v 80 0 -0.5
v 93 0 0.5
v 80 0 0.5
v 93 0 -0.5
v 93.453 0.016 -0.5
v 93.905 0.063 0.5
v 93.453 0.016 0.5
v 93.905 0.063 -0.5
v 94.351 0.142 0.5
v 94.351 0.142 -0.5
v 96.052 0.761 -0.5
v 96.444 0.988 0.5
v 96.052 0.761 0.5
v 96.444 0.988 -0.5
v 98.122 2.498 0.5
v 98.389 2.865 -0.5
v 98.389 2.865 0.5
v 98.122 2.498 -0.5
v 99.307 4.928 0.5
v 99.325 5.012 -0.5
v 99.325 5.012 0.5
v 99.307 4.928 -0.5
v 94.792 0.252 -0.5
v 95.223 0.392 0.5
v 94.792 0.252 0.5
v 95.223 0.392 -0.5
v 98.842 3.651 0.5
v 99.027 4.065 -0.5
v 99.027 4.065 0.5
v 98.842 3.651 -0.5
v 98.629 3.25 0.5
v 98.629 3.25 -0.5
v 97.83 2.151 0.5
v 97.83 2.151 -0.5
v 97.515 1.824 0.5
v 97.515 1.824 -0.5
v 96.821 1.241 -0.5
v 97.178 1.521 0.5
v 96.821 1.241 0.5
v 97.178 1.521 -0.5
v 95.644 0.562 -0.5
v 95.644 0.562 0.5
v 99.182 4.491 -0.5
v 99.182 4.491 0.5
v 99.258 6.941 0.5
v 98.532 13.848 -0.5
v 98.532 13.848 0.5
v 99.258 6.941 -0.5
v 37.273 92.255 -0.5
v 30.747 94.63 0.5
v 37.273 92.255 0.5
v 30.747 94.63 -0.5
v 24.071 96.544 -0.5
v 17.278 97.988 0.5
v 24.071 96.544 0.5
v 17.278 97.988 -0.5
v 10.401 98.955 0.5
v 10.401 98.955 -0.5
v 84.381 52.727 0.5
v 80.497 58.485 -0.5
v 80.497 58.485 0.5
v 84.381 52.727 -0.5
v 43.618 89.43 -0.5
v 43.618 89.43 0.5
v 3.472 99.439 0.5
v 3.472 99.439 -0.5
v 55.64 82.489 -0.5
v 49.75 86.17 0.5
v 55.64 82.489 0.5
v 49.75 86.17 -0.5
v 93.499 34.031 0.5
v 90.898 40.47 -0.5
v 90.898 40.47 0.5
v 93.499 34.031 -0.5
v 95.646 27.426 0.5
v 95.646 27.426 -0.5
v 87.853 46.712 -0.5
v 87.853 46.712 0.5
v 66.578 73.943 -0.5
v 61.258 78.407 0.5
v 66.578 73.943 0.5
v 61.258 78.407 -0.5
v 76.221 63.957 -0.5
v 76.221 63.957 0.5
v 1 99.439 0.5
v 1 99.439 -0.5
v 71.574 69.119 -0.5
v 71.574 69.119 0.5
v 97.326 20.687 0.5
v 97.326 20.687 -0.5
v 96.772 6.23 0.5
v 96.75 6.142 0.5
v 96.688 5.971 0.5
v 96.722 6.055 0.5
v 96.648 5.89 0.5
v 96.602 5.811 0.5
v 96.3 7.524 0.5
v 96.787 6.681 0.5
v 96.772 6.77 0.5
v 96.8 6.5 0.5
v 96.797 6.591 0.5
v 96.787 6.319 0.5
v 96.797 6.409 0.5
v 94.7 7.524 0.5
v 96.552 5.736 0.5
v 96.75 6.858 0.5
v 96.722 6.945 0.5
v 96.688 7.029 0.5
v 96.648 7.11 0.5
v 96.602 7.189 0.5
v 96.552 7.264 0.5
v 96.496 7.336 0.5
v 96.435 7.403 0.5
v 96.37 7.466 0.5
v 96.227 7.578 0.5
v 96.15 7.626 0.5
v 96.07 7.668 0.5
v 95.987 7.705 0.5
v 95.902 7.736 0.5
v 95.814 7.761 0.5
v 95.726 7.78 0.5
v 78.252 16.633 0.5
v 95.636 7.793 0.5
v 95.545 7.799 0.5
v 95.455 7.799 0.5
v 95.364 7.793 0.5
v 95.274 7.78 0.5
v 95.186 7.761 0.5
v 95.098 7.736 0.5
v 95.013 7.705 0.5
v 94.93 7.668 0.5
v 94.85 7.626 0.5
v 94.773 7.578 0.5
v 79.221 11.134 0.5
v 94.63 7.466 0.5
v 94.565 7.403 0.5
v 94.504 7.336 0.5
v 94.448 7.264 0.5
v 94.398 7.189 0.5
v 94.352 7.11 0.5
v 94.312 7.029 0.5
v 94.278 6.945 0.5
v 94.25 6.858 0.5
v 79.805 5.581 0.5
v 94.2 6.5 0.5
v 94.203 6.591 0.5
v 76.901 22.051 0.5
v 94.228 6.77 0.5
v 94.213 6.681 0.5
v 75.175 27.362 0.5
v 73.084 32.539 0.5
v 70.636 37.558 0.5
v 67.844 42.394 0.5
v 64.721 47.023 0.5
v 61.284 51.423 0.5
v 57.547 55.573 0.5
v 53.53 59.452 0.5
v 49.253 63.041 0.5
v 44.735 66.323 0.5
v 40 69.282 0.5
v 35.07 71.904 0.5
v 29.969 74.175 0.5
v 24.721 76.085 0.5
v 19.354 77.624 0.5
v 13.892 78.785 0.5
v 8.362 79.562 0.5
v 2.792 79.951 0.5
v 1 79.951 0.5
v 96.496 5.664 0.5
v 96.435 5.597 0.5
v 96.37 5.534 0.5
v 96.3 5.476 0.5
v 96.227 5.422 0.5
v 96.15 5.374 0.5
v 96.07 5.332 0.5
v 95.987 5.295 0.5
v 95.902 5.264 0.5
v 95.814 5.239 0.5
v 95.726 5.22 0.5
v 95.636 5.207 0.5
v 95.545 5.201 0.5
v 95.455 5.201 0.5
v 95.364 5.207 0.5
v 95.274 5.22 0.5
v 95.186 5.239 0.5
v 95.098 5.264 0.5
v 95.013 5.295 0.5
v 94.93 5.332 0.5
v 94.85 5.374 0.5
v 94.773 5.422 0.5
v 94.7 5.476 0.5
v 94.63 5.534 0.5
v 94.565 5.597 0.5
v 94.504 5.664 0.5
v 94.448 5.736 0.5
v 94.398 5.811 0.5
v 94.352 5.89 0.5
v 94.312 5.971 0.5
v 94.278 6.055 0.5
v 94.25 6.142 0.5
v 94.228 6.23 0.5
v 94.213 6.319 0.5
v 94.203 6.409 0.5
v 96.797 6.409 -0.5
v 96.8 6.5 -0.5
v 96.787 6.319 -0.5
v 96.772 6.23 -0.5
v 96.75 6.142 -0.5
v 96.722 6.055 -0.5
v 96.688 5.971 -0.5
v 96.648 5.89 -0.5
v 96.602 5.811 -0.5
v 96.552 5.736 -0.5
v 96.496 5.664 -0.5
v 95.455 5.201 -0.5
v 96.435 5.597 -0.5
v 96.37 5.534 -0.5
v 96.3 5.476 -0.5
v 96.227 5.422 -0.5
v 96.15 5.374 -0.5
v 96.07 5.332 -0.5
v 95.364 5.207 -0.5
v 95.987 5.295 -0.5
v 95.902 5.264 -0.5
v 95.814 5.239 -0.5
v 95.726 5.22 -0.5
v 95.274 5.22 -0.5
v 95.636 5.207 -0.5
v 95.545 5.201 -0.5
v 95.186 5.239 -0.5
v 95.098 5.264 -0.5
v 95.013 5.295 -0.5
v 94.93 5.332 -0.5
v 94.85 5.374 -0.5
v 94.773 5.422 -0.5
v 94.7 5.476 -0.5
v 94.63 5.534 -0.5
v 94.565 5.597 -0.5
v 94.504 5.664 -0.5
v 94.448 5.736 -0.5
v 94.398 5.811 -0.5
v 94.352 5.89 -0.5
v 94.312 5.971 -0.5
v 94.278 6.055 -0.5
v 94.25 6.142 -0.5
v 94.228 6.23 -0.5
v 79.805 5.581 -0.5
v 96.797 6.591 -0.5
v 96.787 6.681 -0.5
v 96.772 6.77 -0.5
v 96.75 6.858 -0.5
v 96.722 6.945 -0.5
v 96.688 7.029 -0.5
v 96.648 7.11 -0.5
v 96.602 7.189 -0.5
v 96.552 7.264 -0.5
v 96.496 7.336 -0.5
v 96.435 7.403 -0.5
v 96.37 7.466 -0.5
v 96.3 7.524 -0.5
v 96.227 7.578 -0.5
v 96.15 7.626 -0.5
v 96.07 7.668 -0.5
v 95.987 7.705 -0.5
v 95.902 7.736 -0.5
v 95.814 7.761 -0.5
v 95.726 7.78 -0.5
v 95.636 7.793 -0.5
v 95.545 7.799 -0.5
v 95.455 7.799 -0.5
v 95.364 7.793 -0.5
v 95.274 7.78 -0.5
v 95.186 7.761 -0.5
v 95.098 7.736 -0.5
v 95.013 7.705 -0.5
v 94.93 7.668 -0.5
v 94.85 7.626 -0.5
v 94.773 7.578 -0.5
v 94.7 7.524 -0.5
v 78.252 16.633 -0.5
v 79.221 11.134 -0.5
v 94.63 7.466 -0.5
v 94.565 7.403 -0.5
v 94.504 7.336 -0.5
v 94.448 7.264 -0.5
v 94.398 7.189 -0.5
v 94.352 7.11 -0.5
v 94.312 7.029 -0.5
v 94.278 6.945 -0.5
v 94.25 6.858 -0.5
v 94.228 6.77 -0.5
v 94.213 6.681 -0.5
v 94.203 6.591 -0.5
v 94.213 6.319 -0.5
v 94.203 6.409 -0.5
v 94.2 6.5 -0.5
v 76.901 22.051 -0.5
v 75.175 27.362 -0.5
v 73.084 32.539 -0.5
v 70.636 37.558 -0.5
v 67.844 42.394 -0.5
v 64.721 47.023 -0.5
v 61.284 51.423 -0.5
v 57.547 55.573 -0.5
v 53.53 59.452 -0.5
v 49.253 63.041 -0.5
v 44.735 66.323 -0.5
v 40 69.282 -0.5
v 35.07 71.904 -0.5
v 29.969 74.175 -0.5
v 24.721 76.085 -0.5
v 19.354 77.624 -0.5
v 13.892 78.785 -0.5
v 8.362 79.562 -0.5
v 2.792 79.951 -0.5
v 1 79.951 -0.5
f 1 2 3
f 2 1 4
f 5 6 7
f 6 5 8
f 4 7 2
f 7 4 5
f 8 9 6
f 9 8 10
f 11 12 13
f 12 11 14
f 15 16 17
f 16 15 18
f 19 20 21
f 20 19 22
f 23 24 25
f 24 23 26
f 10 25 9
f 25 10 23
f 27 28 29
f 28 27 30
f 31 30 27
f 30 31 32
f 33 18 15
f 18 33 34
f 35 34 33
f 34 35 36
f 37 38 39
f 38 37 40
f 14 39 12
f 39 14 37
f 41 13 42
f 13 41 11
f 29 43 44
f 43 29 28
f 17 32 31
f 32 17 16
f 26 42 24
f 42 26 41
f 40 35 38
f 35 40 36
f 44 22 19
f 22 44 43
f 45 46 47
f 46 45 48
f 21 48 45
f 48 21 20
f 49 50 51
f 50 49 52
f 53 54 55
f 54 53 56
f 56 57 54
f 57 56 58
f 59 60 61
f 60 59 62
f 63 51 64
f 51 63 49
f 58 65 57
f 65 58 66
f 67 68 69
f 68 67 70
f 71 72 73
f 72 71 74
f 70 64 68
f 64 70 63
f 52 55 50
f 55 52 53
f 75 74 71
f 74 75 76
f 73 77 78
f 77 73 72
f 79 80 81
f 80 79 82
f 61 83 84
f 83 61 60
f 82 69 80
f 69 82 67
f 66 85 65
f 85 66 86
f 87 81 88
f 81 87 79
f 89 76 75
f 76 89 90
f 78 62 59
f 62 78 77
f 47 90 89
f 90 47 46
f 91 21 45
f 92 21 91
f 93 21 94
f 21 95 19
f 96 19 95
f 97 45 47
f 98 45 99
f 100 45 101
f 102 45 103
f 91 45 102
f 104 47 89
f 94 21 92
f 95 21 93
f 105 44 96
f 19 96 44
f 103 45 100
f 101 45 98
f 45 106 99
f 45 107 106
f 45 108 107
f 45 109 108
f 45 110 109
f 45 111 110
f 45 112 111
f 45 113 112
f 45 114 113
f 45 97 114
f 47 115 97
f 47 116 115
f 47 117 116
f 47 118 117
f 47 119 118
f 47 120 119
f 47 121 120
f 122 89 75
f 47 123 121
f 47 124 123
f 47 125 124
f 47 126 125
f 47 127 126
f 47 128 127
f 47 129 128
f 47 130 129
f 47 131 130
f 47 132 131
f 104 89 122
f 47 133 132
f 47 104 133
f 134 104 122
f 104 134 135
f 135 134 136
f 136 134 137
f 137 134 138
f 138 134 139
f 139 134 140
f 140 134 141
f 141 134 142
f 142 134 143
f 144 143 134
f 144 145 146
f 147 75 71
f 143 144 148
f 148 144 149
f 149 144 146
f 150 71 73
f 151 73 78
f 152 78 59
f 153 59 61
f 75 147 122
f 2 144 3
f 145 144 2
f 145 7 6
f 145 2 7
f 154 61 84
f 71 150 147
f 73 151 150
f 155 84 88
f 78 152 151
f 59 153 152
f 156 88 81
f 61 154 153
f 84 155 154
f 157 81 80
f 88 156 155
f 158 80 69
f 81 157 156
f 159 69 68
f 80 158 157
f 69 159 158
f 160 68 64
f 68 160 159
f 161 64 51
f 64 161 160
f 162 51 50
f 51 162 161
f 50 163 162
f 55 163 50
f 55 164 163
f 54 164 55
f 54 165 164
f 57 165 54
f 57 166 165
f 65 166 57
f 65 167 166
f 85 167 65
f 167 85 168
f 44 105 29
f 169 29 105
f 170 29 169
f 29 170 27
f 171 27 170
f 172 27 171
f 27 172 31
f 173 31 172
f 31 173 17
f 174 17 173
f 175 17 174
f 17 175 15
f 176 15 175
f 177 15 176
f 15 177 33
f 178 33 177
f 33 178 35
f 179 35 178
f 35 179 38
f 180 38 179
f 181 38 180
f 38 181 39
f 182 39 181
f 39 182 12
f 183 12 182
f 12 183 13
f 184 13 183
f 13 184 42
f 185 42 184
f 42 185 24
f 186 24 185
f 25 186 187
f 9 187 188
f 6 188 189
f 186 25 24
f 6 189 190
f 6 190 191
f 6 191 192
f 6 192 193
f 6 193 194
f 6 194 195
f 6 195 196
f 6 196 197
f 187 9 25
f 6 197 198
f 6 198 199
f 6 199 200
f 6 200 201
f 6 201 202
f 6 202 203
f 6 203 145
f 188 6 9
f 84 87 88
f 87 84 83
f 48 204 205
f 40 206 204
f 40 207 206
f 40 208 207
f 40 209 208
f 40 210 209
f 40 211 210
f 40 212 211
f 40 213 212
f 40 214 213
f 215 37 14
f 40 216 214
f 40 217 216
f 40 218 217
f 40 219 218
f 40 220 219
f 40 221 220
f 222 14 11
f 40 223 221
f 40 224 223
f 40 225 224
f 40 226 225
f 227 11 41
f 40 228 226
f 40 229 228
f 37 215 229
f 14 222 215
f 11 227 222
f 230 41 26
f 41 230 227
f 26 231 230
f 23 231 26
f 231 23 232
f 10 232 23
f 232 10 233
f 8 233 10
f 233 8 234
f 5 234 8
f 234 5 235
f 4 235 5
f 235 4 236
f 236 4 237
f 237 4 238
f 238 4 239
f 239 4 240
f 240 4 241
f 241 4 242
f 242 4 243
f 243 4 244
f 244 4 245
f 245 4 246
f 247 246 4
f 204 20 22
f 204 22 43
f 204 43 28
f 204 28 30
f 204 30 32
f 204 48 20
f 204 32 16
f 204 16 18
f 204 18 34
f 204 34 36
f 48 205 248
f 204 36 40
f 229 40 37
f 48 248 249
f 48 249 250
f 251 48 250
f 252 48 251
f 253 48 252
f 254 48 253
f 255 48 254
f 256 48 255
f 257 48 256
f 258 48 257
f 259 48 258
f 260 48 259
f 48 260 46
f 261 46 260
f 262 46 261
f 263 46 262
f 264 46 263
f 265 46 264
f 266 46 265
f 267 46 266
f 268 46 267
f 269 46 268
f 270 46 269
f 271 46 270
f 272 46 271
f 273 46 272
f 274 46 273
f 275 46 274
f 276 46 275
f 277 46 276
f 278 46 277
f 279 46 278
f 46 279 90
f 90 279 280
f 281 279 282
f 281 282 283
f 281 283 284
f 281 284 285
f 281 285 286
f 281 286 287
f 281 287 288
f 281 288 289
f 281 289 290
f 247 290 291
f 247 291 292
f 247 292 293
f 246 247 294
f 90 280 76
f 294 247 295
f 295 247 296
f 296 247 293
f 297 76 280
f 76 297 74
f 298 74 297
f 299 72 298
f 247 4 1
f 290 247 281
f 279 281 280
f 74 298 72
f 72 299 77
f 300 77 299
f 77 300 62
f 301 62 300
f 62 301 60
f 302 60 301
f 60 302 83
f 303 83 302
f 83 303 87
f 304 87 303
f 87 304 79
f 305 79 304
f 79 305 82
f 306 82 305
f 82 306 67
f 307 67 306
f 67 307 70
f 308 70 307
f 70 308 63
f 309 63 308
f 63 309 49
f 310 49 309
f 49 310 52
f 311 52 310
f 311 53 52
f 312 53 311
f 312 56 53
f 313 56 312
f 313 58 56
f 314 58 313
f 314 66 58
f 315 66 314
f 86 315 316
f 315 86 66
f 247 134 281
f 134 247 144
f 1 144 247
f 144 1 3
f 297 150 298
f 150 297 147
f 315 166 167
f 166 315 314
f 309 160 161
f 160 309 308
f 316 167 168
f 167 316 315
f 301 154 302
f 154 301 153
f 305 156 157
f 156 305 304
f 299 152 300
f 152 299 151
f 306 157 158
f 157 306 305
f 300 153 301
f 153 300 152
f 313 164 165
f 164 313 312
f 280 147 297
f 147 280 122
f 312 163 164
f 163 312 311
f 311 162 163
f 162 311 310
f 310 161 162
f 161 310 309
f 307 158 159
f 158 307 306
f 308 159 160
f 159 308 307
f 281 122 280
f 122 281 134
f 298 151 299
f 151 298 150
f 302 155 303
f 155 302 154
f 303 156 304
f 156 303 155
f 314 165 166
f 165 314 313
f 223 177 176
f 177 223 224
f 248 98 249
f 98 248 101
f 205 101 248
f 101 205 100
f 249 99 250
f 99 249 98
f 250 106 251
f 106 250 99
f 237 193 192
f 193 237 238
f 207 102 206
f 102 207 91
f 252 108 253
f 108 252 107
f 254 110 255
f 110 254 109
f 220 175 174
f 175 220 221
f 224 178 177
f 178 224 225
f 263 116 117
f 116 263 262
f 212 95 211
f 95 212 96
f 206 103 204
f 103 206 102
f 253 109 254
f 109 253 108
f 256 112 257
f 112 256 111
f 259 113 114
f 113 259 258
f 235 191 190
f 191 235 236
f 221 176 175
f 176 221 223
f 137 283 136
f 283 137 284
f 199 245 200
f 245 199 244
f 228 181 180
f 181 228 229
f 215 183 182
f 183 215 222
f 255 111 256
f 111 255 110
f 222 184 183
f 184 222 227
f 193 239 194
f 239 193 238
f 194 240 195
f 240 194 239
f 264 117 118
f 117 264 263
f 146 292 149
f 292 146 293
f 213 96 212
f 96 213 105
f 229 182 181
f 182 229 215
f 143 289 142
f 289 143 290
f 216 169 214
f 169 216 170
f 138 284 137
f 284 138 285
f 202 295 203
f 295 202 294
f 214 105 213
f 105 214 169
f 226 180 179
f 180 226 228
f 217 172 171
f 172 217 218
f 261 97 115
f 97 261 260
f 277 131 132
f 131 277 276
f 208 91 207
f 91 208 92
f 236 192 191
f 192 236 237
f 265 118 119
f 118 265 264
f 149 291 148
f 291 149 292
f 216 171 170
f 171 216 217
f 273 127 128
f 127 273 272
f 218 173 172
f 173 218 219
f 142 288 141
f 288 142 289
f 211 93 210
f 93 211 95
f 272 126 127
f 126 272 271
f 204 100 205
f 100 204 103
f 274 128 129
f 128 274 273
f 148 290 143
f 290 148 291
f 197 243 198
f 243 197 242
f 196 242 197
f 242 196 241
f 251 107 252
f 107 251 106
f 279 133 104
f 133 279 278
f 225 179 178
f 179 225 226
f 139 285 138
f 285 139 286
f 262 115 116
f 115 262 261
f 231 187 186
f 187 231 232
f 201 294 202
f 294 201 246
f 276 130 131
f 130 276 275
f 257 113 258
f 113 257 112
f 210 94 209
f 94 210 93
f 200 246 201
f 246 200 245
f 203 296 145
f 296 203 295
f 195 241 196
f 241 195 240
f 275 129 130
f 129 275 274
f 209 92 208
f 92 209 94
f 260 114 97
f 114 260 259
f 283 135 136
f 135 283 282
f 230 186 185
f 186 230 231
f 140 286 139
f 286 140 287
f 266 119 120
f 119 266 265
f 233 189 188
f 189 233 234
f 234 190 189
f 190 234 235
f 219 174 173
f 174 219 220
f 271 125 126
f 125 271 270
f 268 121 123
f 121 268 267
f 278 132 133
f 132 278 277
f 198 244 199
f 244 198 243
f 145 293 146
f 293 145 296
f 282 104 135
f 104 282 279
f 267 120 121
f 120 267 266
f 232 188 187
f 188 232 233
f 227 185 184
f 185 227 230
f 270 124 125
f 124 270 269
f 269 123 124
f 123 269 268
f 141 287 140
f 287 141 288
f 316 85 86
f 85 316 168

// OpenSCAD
// file: _common.scad
$fa=4; // default minimum facet angle is now 0.5
$fs=0.05; // default minimum facet size is now 0.05 mm

innerRad = 80/2;
outerRad = 199/2;
depth = 60;
height = 62;

m3TapRad = 1.3;
screwHoleXDistance = 4;
screwHoleYDistance = 6.5;
// main file
include <_common.scad>;

intersection() {
  difference() {
    cylinder(r = outerRad, h = 1, center = true);
    cylinder(r = innerRad * 2, h = 2, center = true);
    translate([outerRad - screwHoleXDistance, screwHoleYDistance, 0]) cylinder(r = m3TapRad, h = 3, center = true);
    translate([0, 0, -1]) cube([1, outerRad + 1, height + 1]);
    translate([outerRad - screwHoleYDistance, screwHoleYDistance, -1.5]) rotate([0, 0, -90]) difference() {
      cube([screwHoleYDistance, screwHoleYDistance, height + 3]);
      translate([0, 0, -.5]) cylinder(r = screwHoleYDistance, h = height + 3);
    }
  }
  translate([0, 0, -5]) cube([100, 100, 10]);
}
